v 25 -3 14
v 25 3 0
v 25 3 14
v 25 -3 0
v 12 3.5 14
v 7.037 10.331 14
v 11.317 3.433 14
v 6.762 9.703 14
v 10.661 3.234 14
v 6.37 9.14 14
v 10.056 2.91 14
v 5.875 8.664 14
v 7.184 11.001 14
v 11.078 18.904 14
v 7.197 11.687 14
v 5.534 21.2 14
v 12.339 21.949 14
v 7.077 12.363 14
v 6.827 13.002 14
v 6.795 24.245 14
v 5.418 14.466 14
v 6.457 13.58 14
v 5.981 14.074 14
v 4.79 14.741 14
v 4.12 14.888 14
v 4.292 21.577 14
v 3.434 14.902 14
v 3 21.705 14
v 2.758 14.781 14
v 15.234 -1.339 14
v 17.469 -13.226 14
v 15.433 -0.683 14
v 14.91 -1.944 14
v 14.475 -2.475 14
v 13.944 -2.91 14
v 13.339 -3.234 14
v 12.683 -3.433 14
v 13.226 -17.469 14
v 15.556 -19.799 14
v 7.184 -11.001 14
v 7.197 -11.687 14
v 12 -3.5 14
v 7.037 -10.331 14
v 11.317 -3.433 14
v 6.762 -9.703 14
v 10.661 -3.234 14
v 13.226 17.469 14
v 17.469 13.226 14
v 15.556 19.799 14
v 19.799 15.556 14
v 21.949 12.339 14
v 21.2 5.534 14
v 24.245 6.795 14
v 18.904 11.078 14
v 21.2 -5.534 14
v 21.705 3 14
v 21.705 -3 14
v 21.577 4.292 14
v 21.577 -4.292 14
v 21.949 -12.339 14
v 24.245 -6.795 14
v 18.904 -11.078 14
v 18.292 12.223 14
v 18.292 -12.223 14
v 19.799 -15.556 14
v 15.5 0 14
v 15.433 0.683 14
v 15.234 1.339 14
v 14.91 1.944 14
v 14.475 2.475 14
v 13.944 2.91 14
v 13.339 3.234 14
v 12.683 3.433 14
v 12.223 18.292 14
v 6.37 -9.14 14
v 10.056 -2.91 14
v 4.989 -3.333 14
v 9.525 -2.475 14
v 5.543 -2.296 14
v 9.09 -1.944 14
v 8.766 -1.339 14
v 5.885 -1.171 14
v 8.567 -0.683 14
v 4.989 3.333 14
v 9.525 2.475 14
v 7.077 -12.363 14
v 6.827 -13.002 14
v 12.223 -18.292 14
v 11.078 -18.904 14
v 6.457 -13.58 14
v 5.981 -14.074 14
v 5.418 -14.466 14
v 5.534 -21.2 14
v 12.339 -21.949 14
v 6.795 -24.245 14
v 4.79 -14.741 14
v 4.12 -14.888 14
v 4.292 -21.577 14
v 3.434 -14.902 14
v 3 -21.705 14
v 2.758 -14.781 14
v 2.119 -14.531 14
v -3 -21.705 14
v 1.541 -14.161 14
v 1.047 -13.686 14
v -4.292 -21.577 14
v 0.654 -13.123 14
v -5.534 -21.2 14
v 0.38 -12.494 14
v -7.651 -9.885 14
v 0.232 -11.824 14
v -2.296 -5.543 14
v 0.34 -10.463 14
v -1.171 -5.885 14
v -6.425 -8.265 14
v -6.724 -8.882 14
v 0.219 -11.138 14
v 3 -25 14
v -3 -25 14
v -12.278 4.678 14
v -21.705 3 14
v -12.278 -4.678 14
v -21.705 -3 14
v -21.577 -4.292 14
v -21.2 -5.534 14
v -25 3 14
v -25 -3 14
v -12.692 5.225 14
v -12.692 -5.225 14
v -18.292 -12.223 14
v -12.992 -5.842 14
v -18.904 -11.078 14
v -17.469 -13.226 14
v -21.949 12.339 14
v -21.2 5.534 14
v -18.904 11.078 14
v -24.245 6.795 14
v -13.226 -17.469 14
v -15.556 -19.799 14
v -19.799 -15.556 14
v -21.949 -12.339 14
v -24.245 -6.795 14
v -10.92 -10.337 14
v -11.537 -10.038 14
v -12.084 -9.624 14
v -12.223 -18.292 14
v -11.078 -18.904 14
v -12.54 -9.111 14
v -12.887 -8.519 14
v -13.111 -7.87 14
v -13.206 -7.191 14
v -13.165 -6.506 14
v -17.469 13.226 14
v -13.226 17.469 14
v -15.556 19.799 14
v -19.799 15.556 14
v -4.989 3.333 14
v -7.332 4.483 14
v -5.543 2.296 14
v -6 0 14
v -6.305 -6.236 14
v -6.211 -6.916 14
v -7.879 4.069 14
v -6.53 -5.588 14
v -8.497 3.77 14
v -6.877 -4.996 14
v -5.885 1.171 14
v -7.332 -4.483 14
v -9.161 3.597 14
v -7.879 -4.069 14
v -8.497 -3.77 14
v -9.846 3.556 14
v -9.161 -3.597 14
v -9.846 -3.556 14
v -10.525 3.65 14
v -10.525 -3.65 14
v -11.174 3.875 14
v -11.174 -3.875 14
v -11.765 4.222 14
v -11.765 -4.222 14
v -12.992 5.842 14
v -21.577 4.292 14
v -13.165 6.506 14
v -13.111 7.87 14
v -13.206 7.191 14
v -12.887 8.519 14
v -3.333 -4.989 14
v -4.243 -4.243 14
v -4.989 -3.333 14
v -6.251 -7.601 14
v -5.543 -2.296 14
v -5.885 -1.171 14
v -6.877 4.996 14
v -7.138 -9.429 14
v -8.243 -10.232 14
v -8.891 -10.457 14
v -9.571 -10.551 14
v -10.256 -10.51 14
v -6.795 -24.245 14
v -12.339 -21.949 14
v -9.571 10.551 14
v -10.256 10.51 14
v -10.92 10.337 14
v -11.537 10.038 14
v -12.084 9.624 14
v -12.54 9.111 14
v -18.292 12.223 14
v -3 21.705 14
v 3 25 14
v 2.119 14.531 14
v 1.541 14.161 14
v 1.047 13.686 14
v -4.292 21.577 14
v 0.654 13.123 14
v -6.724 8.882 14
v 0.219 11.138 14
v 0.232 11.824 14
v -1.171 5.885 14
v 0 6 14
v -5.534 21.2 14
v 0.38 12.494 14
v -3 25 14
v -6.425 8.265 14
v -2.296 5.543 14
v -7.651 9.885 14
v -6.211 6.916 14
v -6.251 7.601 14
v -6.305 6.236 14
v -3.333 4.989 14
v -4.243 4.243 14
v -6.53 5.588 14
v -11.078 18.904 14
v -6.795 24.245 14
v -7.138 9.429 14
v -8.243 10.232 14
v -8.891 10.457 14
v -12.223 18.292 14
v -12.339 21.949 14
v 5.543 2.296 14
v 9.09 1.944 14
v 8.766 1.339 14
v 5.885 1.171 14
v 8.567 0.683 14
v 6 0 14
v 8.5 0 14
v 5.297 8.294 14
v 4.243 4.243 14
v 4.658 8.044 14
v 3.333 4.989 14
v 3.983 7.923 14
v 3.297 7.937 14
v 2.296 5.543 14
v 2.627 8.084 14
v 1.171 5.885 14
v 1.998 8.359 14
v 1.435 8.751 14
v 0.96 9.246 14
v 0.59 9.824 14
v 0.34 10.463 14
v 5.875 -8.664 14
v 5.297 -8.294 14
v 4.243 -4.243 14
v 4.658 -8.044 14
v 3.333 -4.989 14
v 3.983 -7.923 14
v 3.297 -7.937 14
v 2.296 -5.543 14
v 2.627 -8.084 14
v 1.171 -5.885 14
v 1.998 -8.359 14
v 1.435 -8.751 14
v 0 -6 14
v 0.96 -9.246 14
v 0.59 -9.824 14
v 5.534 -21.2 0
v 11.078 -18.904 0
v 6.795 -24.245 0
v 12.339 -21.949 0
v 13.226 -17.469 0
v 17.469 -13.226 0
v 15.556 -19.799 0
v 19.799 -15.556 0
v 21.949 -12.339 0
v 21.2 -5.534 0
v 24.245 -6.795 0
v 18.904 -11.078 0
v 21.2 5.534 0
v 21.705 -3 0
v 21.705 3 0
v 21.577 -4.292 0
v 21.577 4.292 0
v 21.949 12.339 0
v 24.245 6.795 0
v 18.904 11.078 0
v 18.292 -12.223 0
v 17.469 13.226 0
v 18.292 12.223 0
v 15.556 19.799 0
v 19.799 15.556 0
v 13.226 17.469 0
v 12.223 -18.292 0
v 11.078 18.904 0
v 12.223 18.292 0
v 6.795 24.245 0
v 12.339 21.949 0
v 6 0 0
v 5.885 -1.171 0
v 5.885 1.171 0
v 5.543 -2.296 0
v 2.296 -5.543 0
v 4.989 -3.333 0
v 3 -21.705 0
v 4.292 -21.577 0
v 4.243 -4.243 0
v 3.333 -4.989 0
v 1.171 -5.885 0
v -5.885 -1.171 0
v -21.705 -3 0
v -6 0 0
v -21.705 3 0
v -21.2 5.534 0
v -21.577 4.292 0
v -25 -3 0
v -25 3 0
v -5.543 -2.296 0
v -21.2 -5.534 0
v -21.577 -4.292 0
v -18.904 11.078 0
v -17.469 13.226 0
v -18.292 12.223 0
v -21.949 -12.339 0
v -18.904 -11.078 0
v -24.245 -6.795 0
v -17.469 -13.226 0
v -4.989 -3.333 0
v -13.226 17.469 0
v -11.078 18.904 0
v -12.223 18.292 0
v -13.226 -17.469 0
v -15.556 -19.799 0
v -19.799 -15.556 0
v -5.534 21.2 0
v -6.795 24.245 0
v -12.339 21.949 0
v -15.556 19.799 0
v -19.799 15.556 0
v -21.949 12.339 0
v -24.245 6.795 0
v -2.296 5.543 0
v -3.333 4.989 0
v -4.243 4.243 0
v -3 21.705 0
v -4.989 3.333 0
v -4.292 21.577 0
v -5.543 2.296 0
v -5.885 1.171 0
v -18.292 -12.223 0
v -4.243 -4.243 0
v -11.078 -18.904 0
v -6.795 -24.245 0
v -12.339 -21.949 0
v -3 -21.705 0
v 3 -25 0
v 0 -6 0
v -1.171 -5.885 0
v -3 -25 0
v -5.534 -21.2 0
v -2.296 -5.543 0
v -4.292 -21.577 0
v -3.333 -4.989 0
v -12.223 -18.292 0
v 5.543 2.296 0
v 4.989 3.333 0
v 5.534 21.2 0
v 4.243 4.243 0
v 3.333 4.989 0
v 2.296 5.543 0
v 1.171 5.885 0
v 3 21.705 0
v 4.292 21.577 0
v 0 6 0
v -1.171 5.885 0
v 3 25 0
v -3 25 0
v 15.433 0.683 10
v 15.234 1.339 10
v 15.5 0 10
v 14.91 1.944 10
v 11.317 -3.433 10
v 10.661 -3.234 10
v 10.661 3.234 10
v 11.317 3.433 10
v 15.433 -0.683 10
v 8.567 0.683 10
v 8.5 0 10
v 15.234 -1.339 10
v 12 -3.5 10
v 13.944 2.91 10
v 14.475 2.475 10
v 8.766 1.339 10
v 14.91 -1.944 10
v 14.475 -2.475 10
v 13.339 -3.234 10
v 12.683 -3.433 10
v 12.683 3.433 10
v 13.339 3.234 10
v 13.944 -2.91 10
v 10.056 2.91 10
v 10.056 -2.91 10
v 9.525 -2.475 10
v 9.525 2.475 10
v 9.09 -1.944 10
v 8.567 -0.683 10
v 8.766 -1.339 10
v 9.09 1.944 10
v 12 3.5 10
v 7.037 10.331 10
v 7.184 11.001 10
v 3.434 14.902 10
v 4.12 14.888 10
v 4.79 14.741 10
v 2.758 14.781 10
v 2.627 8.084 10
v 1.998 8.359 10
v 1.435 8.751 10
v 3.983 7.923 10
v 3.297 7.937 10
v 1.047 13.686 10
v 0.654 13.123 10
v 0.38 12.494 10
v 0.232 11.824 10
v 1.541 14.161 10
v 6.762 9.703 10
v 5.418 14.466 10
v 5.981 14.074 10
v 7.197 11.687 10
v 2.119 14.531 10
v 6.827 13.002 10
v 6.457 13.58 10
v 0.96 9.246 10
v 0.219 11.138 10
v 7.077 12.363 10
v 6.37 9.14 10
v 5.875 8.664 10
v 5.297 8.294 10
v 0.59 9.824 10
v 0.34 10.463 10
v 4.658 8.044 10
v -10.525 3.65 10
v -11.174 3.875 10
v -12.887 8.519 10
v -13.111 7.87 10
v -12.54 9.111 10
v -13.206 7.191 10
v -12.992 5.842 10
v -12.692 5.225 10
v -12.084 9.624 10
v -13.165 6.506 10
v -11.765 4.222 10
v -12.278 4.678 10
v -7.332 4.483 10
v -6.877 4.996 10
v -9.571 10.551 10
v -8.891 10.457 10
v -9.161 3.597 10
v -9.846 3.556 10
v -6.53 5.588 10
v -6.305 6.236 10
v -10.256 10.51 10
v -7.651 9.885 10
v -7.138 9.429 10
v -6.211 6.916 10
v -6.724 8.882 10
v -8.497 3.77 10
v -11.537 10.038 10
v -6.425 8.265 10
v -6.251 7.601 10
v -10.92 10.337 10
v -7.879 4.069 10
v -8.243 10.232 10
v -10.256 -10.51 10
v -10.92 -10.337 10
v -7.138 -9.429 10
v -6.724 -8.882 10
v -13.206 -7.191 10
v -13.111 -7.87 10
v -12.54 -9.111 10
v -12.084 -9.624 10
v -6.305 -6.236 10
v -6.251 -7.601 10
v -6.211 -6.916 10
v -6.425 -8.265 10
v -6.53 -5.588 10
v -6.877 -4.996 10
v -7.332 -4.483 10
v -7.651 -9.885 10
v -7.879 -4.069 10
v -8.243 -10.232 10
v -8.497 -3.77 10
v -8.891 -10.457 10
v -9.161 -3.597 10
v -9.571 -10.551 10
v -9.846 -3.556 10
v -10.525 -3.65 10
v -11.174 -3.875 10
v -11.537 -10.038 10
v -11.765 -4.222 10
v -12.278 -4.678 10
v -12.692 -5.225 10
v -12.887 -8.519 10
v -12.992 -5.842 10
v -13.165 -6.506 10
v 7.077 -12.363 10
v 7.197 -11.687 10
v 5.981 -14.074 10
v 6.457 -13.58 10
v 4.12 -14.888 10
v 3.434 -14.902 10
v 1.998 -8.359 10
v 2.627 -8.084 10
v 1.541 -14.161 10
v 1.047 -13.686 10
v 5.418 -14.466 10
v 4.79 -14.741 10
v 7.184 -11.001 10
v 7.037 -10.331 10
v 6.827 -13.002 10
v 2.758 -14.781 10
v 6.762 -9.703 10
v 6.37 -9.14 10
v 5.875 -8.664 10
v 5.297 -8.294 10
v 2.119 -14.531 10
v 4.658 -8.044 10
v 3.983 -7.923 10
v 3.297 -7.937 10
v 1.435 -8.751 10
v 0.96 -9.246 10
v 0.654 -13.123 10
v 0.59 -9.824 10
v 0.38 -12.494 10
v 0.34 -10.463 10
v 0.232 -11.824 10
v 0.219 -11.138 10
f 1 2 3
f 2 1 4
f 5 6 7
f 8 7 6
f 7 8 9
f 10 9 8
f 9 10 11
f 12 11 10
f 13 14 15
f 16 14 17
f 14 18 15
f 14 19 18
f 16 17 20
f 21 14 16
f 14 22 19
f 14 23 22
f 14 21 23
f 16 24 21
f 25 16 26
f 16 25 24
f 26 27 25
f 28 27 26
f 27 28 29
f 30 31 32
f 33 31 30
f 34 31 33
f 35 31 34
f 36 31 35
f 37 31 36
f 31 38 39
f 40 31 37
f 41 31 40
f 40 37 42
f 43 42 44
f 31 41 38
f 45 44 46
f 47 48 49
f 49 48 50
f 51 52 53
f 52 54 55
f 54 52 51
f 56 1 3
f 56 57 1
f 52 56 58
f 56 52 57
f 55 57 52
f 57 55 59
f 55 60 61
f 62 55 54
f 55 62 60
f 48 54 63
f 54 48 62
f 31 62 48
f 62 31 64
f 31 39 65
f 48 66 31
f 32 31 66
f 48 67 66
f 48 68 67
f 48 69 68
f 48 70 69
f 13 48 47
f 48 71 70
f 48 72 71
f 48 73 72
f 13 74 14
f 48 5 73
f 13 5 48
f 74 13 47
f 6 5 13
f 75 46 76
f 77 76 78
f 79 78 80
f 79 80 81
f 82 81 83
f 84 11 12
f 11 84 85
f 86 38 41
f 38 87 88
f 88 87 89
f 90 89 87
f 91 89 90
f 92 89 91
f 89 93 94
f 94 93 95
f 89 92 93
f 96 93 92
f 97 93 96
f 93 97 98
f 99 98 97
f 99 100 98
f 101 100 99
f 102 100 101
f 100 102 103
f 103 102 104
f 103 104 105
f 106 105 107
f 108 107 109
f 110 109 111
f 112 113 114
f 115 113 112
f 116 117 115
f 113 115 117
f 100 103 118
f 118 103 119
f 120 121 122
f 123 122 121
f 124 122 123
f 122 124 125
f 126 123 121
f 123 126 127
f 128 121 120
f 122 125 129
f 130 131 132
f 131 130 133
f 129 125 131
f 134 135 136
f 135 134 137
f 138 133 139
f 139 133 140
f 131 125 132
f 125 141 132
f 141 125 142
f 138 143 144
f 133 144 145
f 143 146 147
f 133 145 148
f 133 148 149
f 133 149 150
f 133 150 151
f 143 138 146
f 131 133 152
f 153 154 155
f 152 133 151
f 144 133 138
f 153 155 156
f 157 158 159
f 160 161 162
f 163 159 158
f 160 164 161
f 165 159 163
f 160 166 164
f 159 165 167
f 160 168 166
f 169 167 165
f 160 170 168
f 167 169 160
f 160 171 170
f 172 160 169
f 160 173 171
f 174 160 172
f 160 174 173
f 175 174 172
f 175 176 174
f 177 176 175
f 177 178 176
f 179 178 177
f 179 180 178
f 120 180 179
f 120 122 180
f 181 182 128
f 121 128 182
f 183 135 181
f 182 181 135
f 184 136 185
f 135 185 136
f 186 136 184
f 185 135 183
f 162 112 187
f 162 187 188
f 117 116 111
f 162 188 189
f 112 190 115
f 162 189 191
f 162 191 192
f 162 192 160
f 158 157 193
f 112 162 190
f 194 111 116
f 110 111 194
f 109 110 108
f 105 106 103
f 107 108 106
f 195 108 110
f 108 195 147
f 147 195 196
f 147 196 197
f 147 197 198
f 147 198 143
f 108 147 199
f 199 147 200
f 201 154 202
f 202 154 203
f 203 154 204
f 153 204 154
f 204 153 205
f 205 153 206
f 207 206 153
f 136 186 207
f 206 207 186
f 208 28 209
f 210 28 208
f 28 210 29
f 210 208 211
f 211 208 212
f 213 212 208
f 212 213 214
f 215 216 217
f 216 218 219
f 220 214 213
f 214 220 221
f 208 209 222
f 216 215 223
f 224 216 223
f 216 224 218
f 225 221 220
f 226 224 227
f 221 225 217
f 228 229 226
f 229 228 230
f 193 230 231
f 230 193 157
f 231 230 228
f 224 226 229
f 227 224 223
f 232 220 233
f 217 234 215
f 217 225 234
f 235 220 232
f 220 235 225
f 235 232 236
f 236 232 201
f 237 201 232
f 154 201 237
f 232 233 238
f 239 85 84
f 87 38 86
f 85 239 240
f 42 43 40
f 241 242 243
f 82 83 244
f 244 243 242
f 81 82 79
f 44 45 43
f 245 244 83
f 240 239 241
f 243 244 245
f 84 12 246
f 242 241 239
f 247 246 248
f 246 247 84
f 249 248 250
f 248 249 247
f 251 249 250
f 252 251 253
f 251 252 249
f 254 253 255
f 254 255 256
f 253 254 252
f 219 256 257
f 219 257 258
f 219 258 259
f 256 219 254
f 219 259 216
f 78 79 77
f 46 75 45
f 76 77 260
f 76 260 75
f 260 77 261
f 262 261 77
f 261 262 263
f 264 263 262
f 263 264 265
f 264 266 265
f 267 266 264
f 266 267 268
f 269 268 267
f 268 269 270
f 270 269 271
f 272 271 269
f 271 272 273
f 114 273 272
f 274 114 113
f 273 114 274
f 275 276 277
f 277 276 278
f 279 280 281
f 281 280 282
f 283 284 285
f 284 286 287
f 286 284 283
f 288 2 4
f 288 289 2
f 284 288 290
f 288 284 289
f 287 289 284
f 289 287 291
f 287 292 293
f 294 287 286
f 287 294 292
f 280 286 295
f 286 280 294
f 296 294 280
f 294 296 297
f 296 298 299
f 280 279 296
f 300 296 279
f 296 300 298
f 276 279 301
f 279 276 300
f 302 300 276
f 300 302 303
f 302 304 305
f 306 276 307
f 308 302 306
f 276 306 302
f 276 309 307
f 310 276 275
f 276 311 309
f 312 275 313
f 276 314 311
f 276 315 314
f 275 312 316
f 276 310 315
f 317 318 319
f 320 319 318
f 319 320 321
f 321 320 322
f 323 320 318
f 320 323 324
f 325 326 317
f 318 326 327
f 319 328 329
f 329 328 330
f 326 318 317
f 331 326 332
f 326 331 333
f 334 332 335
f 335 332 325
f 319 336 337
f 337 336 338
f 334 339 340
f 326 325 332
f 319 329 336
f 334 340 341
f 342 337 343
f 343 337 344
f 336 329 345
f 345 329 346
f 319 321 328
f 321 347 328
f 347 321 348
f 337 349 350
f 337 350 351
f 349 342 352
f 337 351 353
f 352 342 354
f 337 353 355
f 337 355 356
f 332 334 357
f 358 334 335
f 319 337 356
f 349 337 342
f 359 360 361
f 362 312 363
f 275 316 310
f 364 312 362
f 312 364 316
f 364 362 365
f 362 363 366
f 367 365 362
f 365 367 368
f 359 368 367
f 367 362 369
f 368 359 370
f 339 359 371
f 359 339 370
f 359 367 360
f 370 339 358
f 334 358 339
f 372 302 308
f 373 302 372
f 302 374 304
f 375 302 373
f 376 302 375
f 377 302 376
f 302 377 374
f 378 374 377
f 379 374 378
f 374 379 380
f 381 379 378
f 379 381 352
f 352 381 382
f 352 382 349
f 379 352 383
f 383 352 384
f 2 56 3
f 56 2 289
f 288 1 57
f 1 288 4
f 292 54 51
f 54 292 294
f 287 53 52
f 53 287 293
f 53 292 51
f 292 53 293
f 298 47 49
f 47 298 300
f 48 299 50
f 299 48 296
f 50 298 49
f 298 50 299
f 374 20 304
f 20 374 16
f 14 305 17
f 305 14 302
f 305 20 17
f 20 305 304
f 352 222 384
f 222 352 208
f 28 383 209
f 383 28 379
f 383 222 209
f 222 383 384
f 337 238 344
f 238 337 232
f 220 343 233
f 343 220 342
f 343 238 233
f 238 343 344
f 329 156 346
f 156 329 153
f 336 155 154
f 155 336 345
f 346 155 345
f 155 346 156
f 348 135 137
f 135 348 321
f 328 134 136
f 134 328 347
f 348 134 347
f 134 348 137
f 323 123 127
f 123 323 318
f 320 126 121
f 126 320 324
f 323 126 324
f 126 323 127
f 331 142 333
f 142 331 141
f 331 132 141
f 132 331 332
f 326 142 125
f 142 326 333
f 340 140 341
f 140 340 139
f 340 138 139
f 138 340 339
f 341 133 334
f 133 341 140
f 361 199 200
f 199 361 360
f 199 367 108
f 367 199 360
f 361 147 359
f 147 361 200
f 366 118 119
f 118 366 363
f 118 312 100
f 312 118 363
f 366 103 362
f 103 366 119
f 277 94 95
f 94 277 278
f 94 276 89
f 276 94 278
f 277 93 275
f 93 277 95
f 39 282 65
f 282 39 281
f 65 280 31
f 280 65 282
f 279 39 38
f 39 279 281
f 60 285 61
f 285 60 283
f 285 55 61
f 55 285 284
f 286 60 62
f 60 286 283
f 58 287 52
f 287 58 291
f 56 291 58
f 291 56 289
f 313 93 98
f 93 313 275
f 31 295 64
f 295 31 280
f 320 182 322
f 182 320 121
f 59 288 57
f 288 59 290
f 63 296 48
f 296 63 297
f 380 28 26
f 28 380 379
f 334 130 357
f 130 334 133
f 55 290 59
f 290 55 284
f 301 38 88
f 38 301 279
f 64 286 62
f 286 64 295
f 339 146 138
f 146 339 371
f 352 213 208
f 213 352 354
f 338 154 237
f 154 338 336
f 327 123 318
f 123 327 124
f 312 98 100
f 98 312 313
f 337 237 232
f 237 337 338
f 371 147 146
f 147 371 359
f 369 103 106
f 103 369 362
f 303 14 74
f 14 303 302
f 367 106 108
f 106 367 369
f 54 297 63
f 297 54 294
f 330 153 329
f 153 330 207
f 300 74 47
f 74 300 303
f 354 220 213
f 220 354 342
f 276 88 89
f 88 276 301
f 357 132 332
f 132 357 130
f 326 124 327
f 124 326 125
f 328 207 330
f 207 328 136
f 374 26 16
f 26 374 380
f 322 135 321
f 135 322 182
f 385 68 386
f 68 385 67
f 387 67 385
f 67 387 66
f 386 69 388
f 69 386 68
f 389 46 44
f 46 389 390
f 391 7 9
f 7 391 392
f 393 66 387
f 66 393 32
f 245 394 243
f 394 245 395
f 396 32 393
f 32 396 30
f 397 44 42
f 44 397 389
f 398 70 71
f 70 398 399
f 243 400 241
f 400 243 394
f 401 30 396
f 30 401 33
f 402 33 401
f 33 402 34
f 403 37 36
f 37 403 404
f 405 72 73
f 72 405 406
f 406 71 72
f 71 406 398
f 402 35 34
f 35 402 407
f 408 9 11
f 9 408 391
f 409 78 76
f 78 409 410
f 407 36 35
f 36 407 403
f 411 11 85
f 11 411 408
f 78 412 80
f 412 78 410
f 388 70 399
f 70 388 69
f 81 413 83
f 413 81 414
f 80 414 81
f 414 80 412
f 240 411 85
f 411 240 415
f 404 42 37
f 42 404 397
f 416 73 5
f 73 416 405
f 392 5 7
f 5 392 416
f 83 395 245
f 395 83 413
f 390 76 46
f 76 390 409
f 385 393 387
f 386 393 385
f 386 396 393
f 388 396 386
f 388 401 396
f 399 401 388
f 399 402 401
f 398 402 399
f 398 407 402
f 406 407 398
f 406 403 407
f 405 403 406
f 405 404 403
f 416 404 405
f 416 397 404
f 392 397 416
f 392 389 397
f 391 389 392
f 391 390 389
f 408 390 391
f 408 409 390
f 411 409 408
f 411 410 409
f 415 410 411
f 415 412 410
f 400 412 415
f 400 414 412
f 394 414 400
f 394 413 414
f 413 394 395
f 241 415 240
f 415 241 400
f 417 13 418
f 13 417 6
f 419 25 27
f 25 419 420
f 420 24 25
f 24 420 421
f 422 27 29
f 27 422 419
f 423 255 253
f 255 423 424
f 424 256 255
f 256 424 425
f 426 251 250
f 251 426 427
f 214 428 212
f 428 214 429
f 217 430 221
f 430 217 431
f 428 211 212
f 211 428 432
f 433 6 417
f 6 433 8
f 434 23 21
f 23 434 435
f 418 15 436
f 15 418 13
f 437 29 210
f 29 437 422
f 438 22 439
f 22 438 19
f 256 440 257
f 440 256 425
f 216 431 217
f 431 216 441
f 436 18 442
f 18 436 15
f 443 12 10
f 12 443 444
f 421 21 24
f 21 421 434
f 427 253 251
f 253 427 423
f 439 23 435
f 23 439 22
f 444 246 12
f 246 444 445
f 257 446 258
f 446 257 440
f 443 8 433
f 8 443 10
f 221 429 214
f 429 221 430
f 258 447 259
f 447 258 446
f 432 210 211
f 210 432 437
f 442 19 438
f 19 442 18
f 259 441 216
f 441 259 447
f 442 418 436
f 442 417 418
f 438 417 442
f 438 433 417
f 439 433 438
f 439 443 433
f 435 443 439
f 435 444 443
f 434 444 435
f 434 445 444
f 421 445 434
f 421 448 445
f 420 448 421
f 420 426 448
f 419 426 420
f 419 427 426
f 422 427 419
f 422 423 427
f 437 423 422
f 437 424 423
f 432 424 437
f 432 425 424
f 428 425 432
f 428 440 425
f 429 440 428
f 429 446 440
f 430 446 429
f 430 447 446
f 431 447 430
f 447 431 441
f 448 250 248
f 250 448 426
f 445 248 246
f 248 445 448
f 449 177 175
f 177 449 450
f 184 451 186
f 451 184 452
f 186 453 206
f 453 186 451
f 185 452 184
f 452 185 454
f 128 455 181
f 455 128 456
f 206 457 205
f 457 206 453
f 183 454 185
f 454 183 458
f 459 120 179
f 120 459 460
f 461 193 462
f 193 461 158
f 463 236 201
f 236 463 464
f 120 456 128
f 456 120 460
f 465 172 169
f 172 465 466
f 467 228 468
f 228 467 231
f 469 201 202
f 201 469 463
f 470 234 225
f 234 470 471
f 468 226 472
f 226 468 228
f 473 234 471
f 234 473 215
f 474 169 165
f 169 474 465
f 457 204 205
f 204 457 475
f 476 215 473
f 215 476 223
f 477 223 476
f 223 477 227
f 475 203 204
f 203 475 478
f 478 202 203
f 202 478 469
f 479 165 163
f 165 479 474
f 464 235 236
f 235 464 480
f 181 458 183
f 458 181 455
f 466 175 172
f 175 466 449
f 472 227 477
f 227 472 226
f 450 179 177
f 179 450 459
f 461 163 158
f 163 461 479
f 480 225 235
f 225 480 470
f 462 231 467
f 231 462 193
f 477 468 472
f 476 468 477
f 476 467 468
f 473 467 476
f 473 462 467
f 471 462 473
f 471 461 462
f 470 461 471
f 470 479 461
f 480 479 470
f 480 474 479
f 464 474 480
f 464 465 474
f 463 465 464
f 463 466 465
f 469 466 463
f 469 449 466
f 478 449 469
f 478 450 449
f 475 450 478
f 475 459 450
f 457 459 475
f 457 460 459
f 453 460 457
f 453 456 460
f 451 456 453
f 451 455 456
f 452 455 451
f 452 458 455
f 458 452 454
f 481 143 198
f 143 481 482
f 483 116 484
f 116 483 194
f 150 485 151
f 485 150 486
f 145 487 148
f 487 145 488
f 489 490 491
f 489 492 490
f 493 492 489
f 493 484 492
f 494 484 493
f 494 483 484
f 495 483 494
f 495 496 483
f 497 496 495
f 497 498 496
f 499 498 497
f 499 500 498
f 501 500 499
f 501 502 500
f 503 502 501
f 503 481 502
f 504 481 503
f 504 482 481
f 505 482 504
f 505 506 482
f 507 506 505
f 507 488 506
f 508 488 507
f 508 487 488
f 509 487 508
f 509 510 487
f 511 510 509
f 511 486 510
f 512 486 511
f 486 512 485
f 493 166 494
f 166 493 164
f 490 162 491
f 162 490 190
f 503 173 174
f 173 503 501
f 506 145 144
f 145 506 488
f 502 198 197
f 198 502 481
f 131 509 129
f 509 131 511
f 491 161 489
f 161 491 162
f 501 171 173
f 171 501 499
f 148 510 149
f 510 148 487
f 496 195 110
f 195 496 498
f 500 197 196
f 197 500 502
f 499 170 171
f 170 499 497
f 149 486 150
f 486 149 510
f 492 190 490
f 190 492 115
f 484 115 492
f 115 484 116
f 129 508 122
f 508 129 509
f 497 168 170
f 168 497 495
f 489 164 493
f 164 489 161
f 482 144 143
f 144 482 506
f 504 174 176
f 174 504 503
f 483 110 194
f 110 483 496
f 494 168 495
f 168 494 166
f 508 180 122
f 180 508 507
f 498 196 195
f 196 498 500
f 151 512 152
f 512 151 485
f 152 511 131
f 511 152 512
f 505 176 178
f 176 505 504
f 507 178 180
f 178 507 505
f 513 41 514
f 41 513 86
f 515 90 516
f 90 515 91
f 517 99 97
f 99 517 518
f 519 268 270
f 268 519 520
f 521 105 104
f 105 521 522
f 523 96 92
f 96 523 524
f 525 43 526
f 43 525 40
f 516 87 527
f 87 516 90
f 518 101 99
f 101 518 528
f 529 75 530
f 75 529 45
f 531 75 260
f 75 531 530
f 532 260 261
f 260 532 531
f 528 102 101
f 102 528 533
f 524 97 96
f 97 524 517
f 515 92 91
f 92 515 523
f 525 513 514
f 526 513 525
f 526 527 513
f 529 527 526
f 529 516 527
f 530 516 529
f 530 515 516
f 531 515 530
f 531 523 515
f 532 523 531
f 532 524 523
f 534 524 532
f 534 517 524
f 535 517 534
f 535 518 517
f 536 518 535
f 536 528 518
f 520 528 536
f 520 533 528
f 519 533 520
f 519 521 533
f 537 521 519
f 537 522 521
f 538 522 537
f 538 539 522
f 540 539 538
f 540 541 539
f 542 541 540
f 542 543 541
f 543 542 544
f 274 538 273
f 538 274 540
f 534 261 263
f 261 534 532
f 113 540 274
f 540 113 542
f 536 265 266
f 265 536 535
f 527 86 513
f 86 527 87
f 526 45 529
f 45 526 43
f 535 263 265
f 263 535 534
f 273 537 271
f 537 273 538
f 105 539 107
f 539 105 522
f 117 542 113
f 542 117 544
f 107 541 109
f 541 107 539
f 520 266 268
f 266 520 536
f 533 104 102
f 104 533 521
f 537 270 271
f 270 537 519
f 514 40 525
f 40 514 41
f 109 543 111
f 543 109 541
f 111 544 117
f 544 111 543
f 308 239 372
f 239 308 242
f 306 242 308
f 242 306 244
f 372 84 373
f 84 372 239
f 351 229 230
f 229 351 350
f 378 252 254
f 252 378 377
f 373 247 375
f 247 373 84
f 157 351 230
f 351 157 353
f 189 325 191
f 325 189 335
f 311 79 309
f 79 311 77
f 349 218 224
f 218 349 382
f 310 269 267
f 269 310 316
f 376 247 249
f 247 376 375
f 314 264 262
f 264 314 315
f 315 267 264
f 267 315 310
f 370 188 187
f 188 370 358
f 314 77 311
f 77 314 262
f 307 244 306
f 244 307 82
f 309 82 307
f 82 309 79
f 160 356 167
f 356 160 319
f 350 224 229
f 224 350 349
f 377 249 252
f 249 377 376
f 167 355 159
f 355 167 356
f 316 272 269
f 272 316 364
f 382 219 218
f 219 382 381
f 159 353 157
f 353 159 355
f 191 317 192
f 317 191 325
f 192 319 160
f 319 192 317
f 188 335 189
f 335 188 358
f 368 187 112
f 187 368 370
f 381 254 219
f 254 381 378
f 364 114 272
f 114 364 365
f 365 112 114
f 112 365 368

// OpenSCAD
$fn = 32;

// ----------------------------------------------------------------------
// Spur blank: lightened gear blank
// ----------------------------------------------------------------------

// --- parameters (mm) ---
disc_r = 22;              // blank root radius
disc_t = 14;              // blank thickness
n_teeth = 16;             // stub tooth count
tooth_w = 6;              // tooth width at the root
tooth_h = 3;              // tooth height above the root
bore_r = 6;               // central bore radius
ring_r = 12;              // lightening pocket ring radius
pocket_r = 3.5;           // lightening pocket radius

out_r = disc_r + tooth_h;  // tip radius
bbox_x = 50.0;  // measured width over the teeth
bbox_y = 50.0;  // measured depth over the teeth

difference() {
union() {
  cylinder(r = disc_r, h = disc_t);
  for (i = [0 : n_teeth - 1])
    rotate([0, 0, i * 360 / n_teeth])
      translate([disc_r - 1, -tooth_w / 2, 0])
        cube([tooth_h + 1, tooth_w, disc_t]);
}
  translate([0, 0, -1]) cylinder(r = bore_r, h = disc_t + 2);
  for (i = [0 : 5])
    rotate([0, 0, i * 72])
      translate([ring_r, 0, disc_t - 4])
        cylinder(r = pocket_r, h = 5);
}
